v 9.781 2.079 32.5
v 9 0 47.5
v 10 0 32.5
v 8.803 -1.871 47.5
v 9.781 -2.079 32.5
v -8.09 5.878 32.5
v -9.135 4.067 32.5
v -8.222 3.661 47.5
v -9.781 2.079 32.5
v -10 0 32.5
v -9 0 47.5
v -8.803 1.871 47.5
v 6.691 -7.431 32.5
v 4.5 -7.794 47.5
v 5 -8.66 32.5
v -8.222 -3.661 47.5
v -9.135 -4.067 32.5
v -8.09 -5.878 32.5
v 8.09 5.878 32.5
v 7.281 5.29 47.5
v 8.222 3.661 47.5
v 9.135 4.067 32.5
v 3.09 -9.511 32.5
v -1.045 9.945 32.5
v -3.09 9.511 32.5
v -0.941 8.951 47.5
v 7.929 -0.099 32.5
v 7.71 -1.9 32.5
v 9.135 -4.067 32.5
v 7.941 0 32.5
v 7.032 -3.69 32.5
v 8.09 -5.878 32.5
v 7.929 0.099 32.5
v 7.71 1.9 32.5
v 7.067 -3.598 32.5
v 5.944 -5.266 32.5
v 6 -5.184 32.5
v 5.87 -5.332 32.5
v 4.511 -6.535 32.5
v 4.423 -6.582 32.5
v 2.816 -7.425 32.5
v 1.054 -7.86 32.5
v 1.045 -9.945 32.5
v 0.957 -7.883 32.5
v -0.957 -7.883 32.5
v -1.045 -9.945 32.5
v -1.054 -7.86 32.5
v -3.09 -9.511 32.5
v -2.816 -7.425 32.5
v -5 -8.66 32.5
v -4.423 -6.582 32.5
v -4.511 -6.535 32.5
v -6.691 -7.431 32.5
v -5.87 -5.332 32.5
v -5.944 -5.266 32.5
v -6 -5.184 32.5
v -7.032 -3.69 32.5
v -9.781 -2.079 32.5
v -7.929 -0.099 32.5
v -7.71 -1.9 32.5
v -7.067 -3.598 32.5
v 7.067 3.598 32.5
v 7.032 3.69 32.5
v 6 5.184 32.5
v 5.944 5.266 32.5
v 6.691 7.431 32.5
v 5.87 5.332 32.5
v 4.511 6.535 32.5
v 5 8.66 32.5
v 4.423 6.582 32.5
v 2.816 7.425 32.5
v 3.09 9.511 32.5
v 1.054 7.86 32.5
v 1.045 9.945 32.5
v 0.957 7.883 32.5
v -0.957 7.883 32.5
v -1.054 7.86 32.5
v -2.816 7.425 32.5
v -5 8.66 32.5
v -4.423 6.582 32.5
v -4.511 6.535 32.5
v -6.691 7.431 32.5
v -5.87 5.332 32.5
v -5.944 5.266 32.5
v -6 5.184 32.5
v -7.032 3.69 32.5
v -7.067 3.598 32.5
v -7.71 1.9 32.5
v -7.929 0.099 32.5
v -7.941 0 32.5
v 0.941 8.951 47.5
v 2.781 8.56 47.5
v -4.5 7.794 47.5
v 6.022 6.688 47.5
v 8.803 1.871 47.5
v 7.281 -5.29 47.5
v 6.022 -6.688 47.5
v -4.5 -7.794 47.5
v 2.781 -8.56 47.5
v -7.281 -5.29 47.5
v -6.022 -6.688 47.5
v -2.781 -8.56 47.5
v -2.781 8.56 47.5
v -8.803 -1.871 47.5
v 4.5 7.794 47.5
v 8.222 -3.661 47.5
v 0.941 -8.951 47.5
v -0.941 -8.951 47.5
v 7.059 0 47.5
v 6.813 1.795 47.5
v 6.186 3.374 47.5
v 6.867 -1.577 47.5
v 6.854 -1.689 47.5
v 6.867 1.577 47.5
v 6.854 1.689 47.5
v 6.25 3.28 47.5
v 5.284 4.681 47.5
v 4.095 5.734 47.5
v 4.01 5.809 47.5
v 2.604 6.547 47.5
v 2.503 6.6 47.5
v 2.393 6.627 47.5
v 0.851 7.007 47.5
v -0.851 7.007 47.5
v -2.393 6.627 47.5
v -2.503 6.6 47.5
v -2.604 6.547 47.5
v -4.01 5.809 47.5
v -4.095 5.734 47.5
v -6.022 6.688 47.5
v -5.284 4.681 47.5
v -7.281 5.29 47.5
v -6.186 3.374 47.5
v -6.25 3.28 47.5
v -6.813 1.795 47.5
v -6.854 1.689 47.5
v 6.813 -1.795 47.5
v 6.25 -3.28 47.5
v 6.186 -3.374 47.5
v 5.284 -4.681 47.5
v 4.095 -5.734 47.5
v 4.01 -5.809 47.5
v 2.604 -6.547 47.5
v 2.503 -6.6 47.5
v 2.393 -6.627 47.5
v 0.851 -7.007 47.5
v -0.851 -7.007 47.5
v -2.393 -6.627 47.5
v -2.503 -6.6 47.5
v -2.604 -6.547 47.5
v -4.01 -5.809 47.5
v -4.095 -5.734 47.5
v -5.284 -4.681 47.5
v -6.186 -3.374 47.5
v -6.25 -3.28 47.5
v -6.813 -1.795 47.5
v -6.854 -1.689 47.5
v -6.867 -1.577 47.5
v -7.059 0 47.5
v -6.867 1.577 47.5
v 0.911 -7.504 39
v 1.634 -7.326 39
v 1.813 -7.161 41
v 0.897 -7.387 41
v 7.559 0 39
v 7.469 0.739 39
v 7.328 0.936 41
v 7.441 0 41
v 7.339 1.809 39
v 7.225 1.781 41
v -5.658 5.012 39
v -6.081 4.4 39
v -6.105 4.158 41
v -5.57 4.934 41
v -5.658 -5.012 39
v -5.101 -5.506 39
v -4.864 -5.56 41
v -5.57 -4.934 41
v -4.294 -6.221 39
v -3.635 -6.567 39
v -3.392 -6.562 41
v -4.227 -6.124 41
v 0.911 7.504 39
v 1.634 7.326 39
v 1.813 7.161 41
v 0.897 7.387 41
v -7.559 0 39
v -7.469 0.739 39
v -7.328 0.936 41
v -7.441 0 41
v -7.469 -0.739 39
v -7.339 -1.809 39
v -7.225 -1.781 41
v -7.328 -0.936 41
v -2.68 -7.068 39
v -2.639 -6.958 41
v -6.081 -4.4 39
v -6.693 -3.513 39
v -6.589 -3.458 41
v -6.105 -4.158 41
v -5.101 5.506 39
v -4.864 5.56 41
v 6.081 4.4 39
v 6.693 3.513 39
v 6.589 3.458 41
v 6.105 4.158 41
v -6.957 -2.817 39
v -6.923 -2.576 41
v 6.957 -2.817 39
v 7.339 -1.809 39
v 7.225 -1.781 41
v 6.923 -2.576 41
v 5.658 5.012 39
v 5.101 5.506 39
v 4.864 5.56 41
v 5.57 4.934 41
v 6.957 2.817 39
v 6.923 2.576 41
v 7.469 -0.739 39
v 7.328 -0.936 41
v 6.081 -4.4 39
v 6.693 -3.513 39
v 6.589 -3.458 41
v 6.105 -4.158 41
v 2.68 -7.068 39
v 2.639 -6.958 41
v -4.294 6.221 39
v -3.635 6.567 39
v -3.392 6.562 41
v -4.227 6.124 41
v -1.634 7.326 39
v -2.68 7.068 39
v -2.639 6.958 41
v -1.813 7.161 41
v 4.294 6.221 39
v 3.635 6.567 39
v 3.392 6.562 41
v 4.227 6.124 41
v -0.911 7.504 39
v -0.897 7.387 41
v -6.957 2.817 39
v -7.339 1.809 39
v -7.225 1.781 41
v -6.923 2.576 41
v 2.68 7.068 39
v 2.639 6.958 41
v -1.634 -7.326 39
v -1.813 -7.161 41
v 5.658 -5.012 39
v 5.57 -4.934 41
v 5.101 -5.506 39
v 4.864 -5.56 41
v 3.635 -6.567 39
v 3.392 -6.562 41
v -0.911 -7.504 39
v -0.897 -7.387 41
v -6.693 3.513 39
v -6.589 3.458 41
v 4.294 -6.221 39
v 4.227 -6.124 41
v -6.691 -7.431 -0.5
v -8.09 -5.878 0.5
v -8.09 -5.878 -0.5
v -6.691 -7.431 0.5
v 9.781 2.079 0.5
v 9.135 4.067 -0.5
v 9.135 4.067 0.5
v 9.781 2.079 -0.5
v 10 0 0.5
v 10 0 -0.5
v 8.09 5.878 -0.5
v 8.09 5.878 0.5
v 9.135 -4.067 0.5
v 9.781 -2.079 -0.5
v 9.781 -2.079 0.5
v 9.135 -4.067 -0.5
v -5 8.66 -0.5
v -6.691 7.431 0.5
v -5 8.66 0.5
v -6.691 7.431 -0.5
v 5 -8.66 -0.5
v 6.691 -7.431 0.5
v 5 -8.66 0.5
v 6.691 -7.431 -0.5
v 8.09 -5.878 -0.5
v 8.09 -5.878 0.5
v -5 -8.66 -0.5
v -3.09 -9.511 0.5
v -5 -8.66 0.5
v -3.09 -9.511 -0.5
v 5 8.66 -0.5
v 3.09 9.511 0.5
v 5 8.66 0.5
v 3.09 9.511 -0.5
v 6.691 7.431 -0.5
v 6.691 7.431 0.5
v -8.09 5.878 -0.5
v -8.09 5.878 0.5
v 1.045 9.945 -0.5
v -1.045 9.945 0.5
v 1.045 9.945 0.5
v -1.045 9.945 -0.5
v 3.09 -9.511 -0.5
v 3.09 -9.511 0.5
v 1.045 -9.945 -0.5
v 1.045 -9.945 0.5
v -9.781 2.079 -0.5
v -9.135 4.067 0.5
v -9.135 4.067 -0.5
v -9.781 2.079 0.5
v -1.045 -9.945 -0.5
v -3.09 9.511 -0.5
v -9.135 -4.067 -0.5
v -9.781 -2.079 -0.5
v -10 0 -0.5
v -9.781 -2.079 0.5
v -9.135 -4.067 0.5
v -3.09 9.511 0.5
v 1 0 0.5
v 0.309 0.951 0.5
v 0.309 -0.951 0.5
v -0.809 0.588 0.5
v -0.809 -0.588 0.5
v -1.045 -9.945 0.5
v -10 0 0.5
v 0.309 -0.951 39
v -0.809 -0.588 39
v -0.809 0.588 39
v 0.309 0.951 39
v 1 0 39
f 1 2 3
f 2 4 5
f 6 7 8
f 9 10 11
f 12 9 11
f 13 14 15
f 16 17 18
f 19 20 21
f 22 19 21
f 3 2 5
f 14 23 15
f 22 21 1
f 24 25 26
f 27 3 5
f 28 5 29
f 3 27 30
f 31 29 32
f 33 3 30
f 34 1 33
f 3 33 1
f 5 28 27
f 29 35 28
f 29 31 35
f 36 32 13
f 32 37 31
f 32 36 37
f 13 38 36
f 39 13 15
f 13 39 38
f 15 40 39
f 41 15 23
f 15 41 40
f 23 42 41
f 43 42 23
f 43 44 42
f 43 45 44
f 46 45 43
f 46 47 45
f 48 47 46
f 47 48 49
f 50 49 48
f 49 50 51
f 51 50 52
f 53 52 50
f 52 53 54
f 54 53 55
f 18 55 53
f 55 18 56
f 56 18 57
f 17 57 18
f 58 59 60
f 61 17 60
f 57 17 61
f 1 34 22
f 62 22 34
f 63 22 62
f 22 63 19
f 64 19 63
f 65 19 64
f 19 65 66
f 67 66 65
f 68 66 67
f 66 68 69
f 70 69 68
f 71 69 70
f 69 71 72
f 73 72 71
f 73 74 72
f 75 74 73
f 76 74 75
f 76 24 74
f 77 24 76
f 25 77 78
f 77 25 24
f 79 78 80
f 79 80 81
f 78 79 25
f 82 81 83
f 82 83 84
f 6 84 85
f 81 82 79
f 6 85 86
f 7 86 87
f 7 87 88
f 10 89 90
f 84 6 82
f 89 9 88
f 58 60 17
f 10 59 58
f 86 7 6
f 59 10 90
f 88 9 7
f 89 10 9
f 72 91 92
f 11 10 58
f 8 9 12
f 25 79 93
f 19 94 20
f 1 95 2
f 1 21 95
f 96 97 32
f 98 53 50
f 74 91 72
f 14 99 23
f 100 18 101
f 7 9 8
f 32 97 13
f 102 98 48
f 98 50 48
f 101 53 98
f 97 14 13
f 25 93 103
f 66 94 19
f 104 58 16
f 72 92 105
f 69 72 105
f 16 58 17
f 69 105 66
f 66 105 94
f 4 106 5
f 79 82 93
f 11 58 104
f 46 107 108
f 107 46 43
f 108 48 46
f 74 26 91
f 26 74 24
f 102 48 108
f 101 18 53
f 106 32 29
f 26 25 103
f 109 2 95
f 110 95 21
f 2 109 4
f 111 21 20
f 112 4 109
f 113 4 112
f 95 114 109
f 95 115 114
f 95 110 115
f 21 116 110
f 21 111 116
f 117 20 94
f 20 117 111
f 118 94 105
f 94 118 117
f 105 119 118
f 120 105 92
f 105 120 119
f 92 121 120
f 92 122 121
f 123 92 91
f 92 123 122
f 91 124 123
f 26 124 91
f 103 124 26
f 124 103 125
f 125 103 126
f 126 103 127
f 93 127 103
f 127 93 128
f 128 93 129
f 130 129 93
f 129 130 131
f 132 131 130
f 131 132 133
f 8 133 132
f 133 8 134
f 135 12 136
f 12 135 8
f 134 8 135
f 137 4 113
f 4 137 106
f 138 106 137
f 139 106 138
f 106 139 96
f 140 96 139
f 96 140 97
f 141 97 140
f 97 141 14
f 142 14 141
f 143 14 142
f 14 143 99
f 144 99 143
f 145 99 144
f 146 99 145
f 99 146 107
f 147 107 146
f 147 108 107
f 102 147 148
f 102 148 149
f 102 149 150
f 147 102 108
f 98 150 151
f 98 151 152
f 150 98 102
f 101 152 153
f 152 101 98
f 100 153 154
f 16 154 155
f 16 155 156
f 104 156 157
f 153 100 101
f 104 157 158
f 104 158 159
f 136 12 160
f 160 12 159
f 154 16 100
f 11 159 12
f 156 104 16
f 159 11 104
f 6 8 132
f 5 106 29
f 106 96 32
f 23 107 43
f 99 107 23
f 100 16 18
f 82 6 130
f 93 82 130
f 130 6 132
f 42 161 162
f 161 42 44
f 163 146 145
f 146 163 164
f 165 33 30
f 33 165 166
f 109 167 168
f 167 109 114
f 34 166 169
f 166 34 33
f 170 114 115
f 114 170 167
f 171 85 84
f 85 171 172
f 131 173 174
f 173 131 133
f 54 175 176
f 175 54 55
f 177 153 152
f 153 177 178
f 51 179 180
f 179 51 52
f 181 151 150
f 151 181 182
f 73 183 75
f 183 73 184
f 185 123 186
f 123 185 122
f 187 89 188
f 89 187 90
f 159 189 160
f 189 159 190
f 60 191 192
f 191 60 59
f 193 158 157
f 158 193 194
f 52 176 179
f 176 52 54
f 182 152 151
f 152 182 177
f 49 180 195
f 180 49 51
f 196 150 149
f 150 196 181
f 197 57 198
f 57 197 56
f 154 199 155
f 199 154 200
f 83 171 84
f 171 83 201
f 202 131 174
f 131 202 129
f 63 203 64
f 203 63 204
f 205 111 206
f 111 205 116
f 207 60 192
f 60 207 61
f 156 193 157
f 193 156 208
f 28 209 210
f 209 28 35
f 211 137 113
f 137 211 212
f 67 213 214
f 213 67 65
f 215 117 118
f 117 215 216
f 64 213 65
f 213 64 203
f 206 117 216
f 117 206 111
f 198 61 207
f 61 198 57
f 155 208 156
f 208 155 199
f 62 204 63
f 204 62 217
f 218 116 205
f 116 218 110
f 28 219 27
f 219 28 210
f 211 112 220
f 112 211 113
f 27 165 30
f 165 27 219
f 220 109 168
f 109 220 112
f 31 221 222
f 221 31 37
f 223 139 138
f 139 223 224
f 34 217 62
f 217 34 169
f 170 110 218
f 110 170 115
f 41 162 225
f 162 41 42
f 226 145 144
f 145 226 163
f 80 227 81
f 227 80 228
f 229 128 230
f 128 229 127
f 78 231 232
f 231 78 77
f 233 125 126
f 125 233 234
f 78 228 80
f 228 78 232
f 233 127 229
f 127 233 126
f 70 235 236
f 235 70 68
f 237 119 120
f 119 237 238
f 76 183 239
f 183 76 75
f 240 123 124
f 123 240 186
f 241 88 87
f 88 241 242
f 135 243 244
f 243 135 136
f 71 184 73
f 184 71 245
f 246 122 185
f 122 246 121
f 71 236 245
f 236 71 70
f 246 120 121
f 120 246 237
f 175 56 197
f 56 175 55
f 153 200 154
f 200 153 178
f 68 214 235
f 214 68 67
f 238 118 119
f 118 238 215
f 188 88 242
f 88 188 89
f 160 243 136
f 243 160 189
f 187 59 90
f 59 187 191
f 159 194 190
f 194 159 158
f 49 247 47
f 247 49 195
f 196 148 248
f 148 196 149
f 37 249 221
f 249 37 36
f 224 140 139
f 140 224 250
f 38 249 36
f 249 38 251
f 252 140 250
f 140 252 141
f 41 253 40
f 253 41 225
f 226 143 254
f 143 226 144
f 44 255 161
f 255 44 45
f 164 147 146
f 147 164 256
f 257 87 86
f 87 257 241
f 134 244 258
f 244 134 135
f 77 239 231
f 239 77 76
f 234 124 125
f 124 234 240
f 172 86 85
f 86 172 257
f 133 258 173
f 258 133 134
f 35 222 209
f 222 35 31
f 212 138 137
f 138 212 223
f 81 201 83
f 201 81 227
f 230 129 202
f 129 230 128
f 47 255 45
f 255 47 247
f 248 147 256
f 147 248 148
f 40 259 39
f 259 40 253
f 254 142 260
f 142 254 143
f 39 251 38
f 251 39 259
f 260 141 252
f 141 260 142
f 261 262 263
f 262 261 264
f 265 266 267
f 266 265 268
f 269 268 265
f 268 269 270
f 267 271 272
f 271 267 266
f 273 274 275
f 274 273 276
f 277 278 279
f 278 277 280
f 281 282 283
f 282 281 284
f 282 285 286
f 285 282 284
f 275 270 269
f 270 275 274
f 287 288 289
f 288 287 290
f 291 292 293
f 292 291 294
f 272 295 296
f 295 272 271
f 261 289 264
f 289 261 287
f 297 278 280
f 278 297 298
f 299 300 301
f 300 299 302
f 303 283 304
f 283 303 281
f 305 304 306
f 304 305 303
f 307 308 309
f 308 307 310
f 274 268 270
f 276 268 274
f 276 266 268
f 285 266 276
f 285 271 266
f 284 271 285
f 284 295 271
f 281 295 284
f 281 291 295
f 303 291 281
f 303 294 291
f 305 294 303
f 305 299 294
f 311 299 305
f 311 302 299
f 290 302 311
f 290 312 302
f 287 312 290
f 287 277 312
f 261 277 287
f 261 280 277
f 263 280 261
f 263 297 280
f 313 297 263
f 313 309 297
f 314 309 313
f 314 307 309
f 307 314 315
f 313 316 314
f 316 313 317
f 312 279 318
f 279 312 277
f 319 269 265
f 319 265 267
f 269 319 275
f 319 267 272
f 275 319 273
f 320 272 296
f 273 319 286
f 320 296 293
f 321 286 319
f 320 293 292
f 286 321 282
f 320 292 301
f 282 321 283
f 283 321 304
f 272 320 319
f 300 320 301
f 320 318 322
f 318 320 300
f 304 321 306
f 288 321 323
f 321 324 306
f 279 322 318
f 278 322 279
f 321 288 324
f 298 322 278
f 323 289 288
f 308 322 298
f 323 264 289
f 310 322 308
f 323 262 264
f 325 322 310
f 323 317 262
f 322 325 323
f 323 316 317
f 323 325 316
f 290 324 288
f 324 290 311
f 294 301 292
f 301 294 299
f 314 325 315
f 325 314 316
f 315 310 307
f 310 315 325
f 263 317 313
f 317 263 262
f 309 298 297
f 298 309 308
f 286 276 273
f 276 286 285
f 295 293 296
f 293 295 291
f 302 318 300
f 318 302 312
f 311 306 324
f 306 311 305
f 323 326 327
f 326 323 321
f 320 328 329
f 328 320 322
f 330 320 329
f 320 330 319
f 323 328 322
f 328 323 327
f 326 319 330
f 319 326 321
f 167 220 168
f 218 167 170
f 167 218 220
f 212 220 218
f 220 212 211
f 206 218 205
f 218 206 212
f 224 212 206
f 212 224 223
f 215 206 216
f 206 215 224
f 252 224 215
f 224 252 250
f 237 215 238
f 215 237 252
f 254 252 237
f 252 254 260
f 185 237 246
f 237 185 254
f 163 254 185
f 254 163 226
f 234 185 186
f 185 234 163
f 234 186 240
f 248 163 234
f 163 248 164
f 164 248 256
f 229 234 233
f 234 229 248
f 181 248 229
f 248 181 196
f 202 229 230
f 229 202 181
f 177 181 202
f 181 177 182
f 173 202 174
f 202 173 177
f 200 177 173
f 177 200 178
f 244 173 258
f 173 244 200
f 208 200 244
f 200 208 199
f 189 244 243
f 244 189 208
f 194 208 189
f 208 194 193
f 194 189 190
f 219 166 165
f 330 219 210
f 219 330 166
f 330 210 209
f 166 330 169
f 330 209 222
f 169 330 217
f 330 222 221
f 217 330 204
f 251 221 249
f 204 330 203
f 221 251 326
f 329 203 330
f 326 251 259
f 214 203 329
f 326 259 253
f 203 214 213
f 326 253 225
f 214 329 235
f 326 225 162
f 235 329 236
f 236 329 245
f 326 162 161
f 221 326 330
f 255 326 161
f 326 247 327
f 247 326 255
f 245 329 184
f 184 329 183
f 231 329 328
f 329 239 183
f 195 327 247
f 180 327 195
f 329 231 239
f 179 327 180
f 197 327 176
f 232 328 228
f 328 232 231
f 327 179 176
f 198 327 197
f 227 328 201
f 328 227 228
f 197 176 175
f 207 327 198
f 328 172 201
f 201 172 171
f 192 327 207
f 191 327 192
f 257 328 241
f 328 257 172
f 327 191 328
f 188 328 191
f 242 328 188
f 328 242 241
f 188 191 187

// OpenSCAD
color("#c1cdcd")
cylinder(1,10,10, center= true);

color("#c1cdcd")
translate([0,0,20])
cylinder(40,1,1, center= true);

color("#ce5a57")
translate([0,0,40])
cylinder(2,8,8, center= true);



difference(){
color("#e47025")
translate([0,0,40])
cylinder(15,10,9, center= true);


color("#e47025")
translate([0,0,40])
cylinder(17,8,7, center= true);

}
